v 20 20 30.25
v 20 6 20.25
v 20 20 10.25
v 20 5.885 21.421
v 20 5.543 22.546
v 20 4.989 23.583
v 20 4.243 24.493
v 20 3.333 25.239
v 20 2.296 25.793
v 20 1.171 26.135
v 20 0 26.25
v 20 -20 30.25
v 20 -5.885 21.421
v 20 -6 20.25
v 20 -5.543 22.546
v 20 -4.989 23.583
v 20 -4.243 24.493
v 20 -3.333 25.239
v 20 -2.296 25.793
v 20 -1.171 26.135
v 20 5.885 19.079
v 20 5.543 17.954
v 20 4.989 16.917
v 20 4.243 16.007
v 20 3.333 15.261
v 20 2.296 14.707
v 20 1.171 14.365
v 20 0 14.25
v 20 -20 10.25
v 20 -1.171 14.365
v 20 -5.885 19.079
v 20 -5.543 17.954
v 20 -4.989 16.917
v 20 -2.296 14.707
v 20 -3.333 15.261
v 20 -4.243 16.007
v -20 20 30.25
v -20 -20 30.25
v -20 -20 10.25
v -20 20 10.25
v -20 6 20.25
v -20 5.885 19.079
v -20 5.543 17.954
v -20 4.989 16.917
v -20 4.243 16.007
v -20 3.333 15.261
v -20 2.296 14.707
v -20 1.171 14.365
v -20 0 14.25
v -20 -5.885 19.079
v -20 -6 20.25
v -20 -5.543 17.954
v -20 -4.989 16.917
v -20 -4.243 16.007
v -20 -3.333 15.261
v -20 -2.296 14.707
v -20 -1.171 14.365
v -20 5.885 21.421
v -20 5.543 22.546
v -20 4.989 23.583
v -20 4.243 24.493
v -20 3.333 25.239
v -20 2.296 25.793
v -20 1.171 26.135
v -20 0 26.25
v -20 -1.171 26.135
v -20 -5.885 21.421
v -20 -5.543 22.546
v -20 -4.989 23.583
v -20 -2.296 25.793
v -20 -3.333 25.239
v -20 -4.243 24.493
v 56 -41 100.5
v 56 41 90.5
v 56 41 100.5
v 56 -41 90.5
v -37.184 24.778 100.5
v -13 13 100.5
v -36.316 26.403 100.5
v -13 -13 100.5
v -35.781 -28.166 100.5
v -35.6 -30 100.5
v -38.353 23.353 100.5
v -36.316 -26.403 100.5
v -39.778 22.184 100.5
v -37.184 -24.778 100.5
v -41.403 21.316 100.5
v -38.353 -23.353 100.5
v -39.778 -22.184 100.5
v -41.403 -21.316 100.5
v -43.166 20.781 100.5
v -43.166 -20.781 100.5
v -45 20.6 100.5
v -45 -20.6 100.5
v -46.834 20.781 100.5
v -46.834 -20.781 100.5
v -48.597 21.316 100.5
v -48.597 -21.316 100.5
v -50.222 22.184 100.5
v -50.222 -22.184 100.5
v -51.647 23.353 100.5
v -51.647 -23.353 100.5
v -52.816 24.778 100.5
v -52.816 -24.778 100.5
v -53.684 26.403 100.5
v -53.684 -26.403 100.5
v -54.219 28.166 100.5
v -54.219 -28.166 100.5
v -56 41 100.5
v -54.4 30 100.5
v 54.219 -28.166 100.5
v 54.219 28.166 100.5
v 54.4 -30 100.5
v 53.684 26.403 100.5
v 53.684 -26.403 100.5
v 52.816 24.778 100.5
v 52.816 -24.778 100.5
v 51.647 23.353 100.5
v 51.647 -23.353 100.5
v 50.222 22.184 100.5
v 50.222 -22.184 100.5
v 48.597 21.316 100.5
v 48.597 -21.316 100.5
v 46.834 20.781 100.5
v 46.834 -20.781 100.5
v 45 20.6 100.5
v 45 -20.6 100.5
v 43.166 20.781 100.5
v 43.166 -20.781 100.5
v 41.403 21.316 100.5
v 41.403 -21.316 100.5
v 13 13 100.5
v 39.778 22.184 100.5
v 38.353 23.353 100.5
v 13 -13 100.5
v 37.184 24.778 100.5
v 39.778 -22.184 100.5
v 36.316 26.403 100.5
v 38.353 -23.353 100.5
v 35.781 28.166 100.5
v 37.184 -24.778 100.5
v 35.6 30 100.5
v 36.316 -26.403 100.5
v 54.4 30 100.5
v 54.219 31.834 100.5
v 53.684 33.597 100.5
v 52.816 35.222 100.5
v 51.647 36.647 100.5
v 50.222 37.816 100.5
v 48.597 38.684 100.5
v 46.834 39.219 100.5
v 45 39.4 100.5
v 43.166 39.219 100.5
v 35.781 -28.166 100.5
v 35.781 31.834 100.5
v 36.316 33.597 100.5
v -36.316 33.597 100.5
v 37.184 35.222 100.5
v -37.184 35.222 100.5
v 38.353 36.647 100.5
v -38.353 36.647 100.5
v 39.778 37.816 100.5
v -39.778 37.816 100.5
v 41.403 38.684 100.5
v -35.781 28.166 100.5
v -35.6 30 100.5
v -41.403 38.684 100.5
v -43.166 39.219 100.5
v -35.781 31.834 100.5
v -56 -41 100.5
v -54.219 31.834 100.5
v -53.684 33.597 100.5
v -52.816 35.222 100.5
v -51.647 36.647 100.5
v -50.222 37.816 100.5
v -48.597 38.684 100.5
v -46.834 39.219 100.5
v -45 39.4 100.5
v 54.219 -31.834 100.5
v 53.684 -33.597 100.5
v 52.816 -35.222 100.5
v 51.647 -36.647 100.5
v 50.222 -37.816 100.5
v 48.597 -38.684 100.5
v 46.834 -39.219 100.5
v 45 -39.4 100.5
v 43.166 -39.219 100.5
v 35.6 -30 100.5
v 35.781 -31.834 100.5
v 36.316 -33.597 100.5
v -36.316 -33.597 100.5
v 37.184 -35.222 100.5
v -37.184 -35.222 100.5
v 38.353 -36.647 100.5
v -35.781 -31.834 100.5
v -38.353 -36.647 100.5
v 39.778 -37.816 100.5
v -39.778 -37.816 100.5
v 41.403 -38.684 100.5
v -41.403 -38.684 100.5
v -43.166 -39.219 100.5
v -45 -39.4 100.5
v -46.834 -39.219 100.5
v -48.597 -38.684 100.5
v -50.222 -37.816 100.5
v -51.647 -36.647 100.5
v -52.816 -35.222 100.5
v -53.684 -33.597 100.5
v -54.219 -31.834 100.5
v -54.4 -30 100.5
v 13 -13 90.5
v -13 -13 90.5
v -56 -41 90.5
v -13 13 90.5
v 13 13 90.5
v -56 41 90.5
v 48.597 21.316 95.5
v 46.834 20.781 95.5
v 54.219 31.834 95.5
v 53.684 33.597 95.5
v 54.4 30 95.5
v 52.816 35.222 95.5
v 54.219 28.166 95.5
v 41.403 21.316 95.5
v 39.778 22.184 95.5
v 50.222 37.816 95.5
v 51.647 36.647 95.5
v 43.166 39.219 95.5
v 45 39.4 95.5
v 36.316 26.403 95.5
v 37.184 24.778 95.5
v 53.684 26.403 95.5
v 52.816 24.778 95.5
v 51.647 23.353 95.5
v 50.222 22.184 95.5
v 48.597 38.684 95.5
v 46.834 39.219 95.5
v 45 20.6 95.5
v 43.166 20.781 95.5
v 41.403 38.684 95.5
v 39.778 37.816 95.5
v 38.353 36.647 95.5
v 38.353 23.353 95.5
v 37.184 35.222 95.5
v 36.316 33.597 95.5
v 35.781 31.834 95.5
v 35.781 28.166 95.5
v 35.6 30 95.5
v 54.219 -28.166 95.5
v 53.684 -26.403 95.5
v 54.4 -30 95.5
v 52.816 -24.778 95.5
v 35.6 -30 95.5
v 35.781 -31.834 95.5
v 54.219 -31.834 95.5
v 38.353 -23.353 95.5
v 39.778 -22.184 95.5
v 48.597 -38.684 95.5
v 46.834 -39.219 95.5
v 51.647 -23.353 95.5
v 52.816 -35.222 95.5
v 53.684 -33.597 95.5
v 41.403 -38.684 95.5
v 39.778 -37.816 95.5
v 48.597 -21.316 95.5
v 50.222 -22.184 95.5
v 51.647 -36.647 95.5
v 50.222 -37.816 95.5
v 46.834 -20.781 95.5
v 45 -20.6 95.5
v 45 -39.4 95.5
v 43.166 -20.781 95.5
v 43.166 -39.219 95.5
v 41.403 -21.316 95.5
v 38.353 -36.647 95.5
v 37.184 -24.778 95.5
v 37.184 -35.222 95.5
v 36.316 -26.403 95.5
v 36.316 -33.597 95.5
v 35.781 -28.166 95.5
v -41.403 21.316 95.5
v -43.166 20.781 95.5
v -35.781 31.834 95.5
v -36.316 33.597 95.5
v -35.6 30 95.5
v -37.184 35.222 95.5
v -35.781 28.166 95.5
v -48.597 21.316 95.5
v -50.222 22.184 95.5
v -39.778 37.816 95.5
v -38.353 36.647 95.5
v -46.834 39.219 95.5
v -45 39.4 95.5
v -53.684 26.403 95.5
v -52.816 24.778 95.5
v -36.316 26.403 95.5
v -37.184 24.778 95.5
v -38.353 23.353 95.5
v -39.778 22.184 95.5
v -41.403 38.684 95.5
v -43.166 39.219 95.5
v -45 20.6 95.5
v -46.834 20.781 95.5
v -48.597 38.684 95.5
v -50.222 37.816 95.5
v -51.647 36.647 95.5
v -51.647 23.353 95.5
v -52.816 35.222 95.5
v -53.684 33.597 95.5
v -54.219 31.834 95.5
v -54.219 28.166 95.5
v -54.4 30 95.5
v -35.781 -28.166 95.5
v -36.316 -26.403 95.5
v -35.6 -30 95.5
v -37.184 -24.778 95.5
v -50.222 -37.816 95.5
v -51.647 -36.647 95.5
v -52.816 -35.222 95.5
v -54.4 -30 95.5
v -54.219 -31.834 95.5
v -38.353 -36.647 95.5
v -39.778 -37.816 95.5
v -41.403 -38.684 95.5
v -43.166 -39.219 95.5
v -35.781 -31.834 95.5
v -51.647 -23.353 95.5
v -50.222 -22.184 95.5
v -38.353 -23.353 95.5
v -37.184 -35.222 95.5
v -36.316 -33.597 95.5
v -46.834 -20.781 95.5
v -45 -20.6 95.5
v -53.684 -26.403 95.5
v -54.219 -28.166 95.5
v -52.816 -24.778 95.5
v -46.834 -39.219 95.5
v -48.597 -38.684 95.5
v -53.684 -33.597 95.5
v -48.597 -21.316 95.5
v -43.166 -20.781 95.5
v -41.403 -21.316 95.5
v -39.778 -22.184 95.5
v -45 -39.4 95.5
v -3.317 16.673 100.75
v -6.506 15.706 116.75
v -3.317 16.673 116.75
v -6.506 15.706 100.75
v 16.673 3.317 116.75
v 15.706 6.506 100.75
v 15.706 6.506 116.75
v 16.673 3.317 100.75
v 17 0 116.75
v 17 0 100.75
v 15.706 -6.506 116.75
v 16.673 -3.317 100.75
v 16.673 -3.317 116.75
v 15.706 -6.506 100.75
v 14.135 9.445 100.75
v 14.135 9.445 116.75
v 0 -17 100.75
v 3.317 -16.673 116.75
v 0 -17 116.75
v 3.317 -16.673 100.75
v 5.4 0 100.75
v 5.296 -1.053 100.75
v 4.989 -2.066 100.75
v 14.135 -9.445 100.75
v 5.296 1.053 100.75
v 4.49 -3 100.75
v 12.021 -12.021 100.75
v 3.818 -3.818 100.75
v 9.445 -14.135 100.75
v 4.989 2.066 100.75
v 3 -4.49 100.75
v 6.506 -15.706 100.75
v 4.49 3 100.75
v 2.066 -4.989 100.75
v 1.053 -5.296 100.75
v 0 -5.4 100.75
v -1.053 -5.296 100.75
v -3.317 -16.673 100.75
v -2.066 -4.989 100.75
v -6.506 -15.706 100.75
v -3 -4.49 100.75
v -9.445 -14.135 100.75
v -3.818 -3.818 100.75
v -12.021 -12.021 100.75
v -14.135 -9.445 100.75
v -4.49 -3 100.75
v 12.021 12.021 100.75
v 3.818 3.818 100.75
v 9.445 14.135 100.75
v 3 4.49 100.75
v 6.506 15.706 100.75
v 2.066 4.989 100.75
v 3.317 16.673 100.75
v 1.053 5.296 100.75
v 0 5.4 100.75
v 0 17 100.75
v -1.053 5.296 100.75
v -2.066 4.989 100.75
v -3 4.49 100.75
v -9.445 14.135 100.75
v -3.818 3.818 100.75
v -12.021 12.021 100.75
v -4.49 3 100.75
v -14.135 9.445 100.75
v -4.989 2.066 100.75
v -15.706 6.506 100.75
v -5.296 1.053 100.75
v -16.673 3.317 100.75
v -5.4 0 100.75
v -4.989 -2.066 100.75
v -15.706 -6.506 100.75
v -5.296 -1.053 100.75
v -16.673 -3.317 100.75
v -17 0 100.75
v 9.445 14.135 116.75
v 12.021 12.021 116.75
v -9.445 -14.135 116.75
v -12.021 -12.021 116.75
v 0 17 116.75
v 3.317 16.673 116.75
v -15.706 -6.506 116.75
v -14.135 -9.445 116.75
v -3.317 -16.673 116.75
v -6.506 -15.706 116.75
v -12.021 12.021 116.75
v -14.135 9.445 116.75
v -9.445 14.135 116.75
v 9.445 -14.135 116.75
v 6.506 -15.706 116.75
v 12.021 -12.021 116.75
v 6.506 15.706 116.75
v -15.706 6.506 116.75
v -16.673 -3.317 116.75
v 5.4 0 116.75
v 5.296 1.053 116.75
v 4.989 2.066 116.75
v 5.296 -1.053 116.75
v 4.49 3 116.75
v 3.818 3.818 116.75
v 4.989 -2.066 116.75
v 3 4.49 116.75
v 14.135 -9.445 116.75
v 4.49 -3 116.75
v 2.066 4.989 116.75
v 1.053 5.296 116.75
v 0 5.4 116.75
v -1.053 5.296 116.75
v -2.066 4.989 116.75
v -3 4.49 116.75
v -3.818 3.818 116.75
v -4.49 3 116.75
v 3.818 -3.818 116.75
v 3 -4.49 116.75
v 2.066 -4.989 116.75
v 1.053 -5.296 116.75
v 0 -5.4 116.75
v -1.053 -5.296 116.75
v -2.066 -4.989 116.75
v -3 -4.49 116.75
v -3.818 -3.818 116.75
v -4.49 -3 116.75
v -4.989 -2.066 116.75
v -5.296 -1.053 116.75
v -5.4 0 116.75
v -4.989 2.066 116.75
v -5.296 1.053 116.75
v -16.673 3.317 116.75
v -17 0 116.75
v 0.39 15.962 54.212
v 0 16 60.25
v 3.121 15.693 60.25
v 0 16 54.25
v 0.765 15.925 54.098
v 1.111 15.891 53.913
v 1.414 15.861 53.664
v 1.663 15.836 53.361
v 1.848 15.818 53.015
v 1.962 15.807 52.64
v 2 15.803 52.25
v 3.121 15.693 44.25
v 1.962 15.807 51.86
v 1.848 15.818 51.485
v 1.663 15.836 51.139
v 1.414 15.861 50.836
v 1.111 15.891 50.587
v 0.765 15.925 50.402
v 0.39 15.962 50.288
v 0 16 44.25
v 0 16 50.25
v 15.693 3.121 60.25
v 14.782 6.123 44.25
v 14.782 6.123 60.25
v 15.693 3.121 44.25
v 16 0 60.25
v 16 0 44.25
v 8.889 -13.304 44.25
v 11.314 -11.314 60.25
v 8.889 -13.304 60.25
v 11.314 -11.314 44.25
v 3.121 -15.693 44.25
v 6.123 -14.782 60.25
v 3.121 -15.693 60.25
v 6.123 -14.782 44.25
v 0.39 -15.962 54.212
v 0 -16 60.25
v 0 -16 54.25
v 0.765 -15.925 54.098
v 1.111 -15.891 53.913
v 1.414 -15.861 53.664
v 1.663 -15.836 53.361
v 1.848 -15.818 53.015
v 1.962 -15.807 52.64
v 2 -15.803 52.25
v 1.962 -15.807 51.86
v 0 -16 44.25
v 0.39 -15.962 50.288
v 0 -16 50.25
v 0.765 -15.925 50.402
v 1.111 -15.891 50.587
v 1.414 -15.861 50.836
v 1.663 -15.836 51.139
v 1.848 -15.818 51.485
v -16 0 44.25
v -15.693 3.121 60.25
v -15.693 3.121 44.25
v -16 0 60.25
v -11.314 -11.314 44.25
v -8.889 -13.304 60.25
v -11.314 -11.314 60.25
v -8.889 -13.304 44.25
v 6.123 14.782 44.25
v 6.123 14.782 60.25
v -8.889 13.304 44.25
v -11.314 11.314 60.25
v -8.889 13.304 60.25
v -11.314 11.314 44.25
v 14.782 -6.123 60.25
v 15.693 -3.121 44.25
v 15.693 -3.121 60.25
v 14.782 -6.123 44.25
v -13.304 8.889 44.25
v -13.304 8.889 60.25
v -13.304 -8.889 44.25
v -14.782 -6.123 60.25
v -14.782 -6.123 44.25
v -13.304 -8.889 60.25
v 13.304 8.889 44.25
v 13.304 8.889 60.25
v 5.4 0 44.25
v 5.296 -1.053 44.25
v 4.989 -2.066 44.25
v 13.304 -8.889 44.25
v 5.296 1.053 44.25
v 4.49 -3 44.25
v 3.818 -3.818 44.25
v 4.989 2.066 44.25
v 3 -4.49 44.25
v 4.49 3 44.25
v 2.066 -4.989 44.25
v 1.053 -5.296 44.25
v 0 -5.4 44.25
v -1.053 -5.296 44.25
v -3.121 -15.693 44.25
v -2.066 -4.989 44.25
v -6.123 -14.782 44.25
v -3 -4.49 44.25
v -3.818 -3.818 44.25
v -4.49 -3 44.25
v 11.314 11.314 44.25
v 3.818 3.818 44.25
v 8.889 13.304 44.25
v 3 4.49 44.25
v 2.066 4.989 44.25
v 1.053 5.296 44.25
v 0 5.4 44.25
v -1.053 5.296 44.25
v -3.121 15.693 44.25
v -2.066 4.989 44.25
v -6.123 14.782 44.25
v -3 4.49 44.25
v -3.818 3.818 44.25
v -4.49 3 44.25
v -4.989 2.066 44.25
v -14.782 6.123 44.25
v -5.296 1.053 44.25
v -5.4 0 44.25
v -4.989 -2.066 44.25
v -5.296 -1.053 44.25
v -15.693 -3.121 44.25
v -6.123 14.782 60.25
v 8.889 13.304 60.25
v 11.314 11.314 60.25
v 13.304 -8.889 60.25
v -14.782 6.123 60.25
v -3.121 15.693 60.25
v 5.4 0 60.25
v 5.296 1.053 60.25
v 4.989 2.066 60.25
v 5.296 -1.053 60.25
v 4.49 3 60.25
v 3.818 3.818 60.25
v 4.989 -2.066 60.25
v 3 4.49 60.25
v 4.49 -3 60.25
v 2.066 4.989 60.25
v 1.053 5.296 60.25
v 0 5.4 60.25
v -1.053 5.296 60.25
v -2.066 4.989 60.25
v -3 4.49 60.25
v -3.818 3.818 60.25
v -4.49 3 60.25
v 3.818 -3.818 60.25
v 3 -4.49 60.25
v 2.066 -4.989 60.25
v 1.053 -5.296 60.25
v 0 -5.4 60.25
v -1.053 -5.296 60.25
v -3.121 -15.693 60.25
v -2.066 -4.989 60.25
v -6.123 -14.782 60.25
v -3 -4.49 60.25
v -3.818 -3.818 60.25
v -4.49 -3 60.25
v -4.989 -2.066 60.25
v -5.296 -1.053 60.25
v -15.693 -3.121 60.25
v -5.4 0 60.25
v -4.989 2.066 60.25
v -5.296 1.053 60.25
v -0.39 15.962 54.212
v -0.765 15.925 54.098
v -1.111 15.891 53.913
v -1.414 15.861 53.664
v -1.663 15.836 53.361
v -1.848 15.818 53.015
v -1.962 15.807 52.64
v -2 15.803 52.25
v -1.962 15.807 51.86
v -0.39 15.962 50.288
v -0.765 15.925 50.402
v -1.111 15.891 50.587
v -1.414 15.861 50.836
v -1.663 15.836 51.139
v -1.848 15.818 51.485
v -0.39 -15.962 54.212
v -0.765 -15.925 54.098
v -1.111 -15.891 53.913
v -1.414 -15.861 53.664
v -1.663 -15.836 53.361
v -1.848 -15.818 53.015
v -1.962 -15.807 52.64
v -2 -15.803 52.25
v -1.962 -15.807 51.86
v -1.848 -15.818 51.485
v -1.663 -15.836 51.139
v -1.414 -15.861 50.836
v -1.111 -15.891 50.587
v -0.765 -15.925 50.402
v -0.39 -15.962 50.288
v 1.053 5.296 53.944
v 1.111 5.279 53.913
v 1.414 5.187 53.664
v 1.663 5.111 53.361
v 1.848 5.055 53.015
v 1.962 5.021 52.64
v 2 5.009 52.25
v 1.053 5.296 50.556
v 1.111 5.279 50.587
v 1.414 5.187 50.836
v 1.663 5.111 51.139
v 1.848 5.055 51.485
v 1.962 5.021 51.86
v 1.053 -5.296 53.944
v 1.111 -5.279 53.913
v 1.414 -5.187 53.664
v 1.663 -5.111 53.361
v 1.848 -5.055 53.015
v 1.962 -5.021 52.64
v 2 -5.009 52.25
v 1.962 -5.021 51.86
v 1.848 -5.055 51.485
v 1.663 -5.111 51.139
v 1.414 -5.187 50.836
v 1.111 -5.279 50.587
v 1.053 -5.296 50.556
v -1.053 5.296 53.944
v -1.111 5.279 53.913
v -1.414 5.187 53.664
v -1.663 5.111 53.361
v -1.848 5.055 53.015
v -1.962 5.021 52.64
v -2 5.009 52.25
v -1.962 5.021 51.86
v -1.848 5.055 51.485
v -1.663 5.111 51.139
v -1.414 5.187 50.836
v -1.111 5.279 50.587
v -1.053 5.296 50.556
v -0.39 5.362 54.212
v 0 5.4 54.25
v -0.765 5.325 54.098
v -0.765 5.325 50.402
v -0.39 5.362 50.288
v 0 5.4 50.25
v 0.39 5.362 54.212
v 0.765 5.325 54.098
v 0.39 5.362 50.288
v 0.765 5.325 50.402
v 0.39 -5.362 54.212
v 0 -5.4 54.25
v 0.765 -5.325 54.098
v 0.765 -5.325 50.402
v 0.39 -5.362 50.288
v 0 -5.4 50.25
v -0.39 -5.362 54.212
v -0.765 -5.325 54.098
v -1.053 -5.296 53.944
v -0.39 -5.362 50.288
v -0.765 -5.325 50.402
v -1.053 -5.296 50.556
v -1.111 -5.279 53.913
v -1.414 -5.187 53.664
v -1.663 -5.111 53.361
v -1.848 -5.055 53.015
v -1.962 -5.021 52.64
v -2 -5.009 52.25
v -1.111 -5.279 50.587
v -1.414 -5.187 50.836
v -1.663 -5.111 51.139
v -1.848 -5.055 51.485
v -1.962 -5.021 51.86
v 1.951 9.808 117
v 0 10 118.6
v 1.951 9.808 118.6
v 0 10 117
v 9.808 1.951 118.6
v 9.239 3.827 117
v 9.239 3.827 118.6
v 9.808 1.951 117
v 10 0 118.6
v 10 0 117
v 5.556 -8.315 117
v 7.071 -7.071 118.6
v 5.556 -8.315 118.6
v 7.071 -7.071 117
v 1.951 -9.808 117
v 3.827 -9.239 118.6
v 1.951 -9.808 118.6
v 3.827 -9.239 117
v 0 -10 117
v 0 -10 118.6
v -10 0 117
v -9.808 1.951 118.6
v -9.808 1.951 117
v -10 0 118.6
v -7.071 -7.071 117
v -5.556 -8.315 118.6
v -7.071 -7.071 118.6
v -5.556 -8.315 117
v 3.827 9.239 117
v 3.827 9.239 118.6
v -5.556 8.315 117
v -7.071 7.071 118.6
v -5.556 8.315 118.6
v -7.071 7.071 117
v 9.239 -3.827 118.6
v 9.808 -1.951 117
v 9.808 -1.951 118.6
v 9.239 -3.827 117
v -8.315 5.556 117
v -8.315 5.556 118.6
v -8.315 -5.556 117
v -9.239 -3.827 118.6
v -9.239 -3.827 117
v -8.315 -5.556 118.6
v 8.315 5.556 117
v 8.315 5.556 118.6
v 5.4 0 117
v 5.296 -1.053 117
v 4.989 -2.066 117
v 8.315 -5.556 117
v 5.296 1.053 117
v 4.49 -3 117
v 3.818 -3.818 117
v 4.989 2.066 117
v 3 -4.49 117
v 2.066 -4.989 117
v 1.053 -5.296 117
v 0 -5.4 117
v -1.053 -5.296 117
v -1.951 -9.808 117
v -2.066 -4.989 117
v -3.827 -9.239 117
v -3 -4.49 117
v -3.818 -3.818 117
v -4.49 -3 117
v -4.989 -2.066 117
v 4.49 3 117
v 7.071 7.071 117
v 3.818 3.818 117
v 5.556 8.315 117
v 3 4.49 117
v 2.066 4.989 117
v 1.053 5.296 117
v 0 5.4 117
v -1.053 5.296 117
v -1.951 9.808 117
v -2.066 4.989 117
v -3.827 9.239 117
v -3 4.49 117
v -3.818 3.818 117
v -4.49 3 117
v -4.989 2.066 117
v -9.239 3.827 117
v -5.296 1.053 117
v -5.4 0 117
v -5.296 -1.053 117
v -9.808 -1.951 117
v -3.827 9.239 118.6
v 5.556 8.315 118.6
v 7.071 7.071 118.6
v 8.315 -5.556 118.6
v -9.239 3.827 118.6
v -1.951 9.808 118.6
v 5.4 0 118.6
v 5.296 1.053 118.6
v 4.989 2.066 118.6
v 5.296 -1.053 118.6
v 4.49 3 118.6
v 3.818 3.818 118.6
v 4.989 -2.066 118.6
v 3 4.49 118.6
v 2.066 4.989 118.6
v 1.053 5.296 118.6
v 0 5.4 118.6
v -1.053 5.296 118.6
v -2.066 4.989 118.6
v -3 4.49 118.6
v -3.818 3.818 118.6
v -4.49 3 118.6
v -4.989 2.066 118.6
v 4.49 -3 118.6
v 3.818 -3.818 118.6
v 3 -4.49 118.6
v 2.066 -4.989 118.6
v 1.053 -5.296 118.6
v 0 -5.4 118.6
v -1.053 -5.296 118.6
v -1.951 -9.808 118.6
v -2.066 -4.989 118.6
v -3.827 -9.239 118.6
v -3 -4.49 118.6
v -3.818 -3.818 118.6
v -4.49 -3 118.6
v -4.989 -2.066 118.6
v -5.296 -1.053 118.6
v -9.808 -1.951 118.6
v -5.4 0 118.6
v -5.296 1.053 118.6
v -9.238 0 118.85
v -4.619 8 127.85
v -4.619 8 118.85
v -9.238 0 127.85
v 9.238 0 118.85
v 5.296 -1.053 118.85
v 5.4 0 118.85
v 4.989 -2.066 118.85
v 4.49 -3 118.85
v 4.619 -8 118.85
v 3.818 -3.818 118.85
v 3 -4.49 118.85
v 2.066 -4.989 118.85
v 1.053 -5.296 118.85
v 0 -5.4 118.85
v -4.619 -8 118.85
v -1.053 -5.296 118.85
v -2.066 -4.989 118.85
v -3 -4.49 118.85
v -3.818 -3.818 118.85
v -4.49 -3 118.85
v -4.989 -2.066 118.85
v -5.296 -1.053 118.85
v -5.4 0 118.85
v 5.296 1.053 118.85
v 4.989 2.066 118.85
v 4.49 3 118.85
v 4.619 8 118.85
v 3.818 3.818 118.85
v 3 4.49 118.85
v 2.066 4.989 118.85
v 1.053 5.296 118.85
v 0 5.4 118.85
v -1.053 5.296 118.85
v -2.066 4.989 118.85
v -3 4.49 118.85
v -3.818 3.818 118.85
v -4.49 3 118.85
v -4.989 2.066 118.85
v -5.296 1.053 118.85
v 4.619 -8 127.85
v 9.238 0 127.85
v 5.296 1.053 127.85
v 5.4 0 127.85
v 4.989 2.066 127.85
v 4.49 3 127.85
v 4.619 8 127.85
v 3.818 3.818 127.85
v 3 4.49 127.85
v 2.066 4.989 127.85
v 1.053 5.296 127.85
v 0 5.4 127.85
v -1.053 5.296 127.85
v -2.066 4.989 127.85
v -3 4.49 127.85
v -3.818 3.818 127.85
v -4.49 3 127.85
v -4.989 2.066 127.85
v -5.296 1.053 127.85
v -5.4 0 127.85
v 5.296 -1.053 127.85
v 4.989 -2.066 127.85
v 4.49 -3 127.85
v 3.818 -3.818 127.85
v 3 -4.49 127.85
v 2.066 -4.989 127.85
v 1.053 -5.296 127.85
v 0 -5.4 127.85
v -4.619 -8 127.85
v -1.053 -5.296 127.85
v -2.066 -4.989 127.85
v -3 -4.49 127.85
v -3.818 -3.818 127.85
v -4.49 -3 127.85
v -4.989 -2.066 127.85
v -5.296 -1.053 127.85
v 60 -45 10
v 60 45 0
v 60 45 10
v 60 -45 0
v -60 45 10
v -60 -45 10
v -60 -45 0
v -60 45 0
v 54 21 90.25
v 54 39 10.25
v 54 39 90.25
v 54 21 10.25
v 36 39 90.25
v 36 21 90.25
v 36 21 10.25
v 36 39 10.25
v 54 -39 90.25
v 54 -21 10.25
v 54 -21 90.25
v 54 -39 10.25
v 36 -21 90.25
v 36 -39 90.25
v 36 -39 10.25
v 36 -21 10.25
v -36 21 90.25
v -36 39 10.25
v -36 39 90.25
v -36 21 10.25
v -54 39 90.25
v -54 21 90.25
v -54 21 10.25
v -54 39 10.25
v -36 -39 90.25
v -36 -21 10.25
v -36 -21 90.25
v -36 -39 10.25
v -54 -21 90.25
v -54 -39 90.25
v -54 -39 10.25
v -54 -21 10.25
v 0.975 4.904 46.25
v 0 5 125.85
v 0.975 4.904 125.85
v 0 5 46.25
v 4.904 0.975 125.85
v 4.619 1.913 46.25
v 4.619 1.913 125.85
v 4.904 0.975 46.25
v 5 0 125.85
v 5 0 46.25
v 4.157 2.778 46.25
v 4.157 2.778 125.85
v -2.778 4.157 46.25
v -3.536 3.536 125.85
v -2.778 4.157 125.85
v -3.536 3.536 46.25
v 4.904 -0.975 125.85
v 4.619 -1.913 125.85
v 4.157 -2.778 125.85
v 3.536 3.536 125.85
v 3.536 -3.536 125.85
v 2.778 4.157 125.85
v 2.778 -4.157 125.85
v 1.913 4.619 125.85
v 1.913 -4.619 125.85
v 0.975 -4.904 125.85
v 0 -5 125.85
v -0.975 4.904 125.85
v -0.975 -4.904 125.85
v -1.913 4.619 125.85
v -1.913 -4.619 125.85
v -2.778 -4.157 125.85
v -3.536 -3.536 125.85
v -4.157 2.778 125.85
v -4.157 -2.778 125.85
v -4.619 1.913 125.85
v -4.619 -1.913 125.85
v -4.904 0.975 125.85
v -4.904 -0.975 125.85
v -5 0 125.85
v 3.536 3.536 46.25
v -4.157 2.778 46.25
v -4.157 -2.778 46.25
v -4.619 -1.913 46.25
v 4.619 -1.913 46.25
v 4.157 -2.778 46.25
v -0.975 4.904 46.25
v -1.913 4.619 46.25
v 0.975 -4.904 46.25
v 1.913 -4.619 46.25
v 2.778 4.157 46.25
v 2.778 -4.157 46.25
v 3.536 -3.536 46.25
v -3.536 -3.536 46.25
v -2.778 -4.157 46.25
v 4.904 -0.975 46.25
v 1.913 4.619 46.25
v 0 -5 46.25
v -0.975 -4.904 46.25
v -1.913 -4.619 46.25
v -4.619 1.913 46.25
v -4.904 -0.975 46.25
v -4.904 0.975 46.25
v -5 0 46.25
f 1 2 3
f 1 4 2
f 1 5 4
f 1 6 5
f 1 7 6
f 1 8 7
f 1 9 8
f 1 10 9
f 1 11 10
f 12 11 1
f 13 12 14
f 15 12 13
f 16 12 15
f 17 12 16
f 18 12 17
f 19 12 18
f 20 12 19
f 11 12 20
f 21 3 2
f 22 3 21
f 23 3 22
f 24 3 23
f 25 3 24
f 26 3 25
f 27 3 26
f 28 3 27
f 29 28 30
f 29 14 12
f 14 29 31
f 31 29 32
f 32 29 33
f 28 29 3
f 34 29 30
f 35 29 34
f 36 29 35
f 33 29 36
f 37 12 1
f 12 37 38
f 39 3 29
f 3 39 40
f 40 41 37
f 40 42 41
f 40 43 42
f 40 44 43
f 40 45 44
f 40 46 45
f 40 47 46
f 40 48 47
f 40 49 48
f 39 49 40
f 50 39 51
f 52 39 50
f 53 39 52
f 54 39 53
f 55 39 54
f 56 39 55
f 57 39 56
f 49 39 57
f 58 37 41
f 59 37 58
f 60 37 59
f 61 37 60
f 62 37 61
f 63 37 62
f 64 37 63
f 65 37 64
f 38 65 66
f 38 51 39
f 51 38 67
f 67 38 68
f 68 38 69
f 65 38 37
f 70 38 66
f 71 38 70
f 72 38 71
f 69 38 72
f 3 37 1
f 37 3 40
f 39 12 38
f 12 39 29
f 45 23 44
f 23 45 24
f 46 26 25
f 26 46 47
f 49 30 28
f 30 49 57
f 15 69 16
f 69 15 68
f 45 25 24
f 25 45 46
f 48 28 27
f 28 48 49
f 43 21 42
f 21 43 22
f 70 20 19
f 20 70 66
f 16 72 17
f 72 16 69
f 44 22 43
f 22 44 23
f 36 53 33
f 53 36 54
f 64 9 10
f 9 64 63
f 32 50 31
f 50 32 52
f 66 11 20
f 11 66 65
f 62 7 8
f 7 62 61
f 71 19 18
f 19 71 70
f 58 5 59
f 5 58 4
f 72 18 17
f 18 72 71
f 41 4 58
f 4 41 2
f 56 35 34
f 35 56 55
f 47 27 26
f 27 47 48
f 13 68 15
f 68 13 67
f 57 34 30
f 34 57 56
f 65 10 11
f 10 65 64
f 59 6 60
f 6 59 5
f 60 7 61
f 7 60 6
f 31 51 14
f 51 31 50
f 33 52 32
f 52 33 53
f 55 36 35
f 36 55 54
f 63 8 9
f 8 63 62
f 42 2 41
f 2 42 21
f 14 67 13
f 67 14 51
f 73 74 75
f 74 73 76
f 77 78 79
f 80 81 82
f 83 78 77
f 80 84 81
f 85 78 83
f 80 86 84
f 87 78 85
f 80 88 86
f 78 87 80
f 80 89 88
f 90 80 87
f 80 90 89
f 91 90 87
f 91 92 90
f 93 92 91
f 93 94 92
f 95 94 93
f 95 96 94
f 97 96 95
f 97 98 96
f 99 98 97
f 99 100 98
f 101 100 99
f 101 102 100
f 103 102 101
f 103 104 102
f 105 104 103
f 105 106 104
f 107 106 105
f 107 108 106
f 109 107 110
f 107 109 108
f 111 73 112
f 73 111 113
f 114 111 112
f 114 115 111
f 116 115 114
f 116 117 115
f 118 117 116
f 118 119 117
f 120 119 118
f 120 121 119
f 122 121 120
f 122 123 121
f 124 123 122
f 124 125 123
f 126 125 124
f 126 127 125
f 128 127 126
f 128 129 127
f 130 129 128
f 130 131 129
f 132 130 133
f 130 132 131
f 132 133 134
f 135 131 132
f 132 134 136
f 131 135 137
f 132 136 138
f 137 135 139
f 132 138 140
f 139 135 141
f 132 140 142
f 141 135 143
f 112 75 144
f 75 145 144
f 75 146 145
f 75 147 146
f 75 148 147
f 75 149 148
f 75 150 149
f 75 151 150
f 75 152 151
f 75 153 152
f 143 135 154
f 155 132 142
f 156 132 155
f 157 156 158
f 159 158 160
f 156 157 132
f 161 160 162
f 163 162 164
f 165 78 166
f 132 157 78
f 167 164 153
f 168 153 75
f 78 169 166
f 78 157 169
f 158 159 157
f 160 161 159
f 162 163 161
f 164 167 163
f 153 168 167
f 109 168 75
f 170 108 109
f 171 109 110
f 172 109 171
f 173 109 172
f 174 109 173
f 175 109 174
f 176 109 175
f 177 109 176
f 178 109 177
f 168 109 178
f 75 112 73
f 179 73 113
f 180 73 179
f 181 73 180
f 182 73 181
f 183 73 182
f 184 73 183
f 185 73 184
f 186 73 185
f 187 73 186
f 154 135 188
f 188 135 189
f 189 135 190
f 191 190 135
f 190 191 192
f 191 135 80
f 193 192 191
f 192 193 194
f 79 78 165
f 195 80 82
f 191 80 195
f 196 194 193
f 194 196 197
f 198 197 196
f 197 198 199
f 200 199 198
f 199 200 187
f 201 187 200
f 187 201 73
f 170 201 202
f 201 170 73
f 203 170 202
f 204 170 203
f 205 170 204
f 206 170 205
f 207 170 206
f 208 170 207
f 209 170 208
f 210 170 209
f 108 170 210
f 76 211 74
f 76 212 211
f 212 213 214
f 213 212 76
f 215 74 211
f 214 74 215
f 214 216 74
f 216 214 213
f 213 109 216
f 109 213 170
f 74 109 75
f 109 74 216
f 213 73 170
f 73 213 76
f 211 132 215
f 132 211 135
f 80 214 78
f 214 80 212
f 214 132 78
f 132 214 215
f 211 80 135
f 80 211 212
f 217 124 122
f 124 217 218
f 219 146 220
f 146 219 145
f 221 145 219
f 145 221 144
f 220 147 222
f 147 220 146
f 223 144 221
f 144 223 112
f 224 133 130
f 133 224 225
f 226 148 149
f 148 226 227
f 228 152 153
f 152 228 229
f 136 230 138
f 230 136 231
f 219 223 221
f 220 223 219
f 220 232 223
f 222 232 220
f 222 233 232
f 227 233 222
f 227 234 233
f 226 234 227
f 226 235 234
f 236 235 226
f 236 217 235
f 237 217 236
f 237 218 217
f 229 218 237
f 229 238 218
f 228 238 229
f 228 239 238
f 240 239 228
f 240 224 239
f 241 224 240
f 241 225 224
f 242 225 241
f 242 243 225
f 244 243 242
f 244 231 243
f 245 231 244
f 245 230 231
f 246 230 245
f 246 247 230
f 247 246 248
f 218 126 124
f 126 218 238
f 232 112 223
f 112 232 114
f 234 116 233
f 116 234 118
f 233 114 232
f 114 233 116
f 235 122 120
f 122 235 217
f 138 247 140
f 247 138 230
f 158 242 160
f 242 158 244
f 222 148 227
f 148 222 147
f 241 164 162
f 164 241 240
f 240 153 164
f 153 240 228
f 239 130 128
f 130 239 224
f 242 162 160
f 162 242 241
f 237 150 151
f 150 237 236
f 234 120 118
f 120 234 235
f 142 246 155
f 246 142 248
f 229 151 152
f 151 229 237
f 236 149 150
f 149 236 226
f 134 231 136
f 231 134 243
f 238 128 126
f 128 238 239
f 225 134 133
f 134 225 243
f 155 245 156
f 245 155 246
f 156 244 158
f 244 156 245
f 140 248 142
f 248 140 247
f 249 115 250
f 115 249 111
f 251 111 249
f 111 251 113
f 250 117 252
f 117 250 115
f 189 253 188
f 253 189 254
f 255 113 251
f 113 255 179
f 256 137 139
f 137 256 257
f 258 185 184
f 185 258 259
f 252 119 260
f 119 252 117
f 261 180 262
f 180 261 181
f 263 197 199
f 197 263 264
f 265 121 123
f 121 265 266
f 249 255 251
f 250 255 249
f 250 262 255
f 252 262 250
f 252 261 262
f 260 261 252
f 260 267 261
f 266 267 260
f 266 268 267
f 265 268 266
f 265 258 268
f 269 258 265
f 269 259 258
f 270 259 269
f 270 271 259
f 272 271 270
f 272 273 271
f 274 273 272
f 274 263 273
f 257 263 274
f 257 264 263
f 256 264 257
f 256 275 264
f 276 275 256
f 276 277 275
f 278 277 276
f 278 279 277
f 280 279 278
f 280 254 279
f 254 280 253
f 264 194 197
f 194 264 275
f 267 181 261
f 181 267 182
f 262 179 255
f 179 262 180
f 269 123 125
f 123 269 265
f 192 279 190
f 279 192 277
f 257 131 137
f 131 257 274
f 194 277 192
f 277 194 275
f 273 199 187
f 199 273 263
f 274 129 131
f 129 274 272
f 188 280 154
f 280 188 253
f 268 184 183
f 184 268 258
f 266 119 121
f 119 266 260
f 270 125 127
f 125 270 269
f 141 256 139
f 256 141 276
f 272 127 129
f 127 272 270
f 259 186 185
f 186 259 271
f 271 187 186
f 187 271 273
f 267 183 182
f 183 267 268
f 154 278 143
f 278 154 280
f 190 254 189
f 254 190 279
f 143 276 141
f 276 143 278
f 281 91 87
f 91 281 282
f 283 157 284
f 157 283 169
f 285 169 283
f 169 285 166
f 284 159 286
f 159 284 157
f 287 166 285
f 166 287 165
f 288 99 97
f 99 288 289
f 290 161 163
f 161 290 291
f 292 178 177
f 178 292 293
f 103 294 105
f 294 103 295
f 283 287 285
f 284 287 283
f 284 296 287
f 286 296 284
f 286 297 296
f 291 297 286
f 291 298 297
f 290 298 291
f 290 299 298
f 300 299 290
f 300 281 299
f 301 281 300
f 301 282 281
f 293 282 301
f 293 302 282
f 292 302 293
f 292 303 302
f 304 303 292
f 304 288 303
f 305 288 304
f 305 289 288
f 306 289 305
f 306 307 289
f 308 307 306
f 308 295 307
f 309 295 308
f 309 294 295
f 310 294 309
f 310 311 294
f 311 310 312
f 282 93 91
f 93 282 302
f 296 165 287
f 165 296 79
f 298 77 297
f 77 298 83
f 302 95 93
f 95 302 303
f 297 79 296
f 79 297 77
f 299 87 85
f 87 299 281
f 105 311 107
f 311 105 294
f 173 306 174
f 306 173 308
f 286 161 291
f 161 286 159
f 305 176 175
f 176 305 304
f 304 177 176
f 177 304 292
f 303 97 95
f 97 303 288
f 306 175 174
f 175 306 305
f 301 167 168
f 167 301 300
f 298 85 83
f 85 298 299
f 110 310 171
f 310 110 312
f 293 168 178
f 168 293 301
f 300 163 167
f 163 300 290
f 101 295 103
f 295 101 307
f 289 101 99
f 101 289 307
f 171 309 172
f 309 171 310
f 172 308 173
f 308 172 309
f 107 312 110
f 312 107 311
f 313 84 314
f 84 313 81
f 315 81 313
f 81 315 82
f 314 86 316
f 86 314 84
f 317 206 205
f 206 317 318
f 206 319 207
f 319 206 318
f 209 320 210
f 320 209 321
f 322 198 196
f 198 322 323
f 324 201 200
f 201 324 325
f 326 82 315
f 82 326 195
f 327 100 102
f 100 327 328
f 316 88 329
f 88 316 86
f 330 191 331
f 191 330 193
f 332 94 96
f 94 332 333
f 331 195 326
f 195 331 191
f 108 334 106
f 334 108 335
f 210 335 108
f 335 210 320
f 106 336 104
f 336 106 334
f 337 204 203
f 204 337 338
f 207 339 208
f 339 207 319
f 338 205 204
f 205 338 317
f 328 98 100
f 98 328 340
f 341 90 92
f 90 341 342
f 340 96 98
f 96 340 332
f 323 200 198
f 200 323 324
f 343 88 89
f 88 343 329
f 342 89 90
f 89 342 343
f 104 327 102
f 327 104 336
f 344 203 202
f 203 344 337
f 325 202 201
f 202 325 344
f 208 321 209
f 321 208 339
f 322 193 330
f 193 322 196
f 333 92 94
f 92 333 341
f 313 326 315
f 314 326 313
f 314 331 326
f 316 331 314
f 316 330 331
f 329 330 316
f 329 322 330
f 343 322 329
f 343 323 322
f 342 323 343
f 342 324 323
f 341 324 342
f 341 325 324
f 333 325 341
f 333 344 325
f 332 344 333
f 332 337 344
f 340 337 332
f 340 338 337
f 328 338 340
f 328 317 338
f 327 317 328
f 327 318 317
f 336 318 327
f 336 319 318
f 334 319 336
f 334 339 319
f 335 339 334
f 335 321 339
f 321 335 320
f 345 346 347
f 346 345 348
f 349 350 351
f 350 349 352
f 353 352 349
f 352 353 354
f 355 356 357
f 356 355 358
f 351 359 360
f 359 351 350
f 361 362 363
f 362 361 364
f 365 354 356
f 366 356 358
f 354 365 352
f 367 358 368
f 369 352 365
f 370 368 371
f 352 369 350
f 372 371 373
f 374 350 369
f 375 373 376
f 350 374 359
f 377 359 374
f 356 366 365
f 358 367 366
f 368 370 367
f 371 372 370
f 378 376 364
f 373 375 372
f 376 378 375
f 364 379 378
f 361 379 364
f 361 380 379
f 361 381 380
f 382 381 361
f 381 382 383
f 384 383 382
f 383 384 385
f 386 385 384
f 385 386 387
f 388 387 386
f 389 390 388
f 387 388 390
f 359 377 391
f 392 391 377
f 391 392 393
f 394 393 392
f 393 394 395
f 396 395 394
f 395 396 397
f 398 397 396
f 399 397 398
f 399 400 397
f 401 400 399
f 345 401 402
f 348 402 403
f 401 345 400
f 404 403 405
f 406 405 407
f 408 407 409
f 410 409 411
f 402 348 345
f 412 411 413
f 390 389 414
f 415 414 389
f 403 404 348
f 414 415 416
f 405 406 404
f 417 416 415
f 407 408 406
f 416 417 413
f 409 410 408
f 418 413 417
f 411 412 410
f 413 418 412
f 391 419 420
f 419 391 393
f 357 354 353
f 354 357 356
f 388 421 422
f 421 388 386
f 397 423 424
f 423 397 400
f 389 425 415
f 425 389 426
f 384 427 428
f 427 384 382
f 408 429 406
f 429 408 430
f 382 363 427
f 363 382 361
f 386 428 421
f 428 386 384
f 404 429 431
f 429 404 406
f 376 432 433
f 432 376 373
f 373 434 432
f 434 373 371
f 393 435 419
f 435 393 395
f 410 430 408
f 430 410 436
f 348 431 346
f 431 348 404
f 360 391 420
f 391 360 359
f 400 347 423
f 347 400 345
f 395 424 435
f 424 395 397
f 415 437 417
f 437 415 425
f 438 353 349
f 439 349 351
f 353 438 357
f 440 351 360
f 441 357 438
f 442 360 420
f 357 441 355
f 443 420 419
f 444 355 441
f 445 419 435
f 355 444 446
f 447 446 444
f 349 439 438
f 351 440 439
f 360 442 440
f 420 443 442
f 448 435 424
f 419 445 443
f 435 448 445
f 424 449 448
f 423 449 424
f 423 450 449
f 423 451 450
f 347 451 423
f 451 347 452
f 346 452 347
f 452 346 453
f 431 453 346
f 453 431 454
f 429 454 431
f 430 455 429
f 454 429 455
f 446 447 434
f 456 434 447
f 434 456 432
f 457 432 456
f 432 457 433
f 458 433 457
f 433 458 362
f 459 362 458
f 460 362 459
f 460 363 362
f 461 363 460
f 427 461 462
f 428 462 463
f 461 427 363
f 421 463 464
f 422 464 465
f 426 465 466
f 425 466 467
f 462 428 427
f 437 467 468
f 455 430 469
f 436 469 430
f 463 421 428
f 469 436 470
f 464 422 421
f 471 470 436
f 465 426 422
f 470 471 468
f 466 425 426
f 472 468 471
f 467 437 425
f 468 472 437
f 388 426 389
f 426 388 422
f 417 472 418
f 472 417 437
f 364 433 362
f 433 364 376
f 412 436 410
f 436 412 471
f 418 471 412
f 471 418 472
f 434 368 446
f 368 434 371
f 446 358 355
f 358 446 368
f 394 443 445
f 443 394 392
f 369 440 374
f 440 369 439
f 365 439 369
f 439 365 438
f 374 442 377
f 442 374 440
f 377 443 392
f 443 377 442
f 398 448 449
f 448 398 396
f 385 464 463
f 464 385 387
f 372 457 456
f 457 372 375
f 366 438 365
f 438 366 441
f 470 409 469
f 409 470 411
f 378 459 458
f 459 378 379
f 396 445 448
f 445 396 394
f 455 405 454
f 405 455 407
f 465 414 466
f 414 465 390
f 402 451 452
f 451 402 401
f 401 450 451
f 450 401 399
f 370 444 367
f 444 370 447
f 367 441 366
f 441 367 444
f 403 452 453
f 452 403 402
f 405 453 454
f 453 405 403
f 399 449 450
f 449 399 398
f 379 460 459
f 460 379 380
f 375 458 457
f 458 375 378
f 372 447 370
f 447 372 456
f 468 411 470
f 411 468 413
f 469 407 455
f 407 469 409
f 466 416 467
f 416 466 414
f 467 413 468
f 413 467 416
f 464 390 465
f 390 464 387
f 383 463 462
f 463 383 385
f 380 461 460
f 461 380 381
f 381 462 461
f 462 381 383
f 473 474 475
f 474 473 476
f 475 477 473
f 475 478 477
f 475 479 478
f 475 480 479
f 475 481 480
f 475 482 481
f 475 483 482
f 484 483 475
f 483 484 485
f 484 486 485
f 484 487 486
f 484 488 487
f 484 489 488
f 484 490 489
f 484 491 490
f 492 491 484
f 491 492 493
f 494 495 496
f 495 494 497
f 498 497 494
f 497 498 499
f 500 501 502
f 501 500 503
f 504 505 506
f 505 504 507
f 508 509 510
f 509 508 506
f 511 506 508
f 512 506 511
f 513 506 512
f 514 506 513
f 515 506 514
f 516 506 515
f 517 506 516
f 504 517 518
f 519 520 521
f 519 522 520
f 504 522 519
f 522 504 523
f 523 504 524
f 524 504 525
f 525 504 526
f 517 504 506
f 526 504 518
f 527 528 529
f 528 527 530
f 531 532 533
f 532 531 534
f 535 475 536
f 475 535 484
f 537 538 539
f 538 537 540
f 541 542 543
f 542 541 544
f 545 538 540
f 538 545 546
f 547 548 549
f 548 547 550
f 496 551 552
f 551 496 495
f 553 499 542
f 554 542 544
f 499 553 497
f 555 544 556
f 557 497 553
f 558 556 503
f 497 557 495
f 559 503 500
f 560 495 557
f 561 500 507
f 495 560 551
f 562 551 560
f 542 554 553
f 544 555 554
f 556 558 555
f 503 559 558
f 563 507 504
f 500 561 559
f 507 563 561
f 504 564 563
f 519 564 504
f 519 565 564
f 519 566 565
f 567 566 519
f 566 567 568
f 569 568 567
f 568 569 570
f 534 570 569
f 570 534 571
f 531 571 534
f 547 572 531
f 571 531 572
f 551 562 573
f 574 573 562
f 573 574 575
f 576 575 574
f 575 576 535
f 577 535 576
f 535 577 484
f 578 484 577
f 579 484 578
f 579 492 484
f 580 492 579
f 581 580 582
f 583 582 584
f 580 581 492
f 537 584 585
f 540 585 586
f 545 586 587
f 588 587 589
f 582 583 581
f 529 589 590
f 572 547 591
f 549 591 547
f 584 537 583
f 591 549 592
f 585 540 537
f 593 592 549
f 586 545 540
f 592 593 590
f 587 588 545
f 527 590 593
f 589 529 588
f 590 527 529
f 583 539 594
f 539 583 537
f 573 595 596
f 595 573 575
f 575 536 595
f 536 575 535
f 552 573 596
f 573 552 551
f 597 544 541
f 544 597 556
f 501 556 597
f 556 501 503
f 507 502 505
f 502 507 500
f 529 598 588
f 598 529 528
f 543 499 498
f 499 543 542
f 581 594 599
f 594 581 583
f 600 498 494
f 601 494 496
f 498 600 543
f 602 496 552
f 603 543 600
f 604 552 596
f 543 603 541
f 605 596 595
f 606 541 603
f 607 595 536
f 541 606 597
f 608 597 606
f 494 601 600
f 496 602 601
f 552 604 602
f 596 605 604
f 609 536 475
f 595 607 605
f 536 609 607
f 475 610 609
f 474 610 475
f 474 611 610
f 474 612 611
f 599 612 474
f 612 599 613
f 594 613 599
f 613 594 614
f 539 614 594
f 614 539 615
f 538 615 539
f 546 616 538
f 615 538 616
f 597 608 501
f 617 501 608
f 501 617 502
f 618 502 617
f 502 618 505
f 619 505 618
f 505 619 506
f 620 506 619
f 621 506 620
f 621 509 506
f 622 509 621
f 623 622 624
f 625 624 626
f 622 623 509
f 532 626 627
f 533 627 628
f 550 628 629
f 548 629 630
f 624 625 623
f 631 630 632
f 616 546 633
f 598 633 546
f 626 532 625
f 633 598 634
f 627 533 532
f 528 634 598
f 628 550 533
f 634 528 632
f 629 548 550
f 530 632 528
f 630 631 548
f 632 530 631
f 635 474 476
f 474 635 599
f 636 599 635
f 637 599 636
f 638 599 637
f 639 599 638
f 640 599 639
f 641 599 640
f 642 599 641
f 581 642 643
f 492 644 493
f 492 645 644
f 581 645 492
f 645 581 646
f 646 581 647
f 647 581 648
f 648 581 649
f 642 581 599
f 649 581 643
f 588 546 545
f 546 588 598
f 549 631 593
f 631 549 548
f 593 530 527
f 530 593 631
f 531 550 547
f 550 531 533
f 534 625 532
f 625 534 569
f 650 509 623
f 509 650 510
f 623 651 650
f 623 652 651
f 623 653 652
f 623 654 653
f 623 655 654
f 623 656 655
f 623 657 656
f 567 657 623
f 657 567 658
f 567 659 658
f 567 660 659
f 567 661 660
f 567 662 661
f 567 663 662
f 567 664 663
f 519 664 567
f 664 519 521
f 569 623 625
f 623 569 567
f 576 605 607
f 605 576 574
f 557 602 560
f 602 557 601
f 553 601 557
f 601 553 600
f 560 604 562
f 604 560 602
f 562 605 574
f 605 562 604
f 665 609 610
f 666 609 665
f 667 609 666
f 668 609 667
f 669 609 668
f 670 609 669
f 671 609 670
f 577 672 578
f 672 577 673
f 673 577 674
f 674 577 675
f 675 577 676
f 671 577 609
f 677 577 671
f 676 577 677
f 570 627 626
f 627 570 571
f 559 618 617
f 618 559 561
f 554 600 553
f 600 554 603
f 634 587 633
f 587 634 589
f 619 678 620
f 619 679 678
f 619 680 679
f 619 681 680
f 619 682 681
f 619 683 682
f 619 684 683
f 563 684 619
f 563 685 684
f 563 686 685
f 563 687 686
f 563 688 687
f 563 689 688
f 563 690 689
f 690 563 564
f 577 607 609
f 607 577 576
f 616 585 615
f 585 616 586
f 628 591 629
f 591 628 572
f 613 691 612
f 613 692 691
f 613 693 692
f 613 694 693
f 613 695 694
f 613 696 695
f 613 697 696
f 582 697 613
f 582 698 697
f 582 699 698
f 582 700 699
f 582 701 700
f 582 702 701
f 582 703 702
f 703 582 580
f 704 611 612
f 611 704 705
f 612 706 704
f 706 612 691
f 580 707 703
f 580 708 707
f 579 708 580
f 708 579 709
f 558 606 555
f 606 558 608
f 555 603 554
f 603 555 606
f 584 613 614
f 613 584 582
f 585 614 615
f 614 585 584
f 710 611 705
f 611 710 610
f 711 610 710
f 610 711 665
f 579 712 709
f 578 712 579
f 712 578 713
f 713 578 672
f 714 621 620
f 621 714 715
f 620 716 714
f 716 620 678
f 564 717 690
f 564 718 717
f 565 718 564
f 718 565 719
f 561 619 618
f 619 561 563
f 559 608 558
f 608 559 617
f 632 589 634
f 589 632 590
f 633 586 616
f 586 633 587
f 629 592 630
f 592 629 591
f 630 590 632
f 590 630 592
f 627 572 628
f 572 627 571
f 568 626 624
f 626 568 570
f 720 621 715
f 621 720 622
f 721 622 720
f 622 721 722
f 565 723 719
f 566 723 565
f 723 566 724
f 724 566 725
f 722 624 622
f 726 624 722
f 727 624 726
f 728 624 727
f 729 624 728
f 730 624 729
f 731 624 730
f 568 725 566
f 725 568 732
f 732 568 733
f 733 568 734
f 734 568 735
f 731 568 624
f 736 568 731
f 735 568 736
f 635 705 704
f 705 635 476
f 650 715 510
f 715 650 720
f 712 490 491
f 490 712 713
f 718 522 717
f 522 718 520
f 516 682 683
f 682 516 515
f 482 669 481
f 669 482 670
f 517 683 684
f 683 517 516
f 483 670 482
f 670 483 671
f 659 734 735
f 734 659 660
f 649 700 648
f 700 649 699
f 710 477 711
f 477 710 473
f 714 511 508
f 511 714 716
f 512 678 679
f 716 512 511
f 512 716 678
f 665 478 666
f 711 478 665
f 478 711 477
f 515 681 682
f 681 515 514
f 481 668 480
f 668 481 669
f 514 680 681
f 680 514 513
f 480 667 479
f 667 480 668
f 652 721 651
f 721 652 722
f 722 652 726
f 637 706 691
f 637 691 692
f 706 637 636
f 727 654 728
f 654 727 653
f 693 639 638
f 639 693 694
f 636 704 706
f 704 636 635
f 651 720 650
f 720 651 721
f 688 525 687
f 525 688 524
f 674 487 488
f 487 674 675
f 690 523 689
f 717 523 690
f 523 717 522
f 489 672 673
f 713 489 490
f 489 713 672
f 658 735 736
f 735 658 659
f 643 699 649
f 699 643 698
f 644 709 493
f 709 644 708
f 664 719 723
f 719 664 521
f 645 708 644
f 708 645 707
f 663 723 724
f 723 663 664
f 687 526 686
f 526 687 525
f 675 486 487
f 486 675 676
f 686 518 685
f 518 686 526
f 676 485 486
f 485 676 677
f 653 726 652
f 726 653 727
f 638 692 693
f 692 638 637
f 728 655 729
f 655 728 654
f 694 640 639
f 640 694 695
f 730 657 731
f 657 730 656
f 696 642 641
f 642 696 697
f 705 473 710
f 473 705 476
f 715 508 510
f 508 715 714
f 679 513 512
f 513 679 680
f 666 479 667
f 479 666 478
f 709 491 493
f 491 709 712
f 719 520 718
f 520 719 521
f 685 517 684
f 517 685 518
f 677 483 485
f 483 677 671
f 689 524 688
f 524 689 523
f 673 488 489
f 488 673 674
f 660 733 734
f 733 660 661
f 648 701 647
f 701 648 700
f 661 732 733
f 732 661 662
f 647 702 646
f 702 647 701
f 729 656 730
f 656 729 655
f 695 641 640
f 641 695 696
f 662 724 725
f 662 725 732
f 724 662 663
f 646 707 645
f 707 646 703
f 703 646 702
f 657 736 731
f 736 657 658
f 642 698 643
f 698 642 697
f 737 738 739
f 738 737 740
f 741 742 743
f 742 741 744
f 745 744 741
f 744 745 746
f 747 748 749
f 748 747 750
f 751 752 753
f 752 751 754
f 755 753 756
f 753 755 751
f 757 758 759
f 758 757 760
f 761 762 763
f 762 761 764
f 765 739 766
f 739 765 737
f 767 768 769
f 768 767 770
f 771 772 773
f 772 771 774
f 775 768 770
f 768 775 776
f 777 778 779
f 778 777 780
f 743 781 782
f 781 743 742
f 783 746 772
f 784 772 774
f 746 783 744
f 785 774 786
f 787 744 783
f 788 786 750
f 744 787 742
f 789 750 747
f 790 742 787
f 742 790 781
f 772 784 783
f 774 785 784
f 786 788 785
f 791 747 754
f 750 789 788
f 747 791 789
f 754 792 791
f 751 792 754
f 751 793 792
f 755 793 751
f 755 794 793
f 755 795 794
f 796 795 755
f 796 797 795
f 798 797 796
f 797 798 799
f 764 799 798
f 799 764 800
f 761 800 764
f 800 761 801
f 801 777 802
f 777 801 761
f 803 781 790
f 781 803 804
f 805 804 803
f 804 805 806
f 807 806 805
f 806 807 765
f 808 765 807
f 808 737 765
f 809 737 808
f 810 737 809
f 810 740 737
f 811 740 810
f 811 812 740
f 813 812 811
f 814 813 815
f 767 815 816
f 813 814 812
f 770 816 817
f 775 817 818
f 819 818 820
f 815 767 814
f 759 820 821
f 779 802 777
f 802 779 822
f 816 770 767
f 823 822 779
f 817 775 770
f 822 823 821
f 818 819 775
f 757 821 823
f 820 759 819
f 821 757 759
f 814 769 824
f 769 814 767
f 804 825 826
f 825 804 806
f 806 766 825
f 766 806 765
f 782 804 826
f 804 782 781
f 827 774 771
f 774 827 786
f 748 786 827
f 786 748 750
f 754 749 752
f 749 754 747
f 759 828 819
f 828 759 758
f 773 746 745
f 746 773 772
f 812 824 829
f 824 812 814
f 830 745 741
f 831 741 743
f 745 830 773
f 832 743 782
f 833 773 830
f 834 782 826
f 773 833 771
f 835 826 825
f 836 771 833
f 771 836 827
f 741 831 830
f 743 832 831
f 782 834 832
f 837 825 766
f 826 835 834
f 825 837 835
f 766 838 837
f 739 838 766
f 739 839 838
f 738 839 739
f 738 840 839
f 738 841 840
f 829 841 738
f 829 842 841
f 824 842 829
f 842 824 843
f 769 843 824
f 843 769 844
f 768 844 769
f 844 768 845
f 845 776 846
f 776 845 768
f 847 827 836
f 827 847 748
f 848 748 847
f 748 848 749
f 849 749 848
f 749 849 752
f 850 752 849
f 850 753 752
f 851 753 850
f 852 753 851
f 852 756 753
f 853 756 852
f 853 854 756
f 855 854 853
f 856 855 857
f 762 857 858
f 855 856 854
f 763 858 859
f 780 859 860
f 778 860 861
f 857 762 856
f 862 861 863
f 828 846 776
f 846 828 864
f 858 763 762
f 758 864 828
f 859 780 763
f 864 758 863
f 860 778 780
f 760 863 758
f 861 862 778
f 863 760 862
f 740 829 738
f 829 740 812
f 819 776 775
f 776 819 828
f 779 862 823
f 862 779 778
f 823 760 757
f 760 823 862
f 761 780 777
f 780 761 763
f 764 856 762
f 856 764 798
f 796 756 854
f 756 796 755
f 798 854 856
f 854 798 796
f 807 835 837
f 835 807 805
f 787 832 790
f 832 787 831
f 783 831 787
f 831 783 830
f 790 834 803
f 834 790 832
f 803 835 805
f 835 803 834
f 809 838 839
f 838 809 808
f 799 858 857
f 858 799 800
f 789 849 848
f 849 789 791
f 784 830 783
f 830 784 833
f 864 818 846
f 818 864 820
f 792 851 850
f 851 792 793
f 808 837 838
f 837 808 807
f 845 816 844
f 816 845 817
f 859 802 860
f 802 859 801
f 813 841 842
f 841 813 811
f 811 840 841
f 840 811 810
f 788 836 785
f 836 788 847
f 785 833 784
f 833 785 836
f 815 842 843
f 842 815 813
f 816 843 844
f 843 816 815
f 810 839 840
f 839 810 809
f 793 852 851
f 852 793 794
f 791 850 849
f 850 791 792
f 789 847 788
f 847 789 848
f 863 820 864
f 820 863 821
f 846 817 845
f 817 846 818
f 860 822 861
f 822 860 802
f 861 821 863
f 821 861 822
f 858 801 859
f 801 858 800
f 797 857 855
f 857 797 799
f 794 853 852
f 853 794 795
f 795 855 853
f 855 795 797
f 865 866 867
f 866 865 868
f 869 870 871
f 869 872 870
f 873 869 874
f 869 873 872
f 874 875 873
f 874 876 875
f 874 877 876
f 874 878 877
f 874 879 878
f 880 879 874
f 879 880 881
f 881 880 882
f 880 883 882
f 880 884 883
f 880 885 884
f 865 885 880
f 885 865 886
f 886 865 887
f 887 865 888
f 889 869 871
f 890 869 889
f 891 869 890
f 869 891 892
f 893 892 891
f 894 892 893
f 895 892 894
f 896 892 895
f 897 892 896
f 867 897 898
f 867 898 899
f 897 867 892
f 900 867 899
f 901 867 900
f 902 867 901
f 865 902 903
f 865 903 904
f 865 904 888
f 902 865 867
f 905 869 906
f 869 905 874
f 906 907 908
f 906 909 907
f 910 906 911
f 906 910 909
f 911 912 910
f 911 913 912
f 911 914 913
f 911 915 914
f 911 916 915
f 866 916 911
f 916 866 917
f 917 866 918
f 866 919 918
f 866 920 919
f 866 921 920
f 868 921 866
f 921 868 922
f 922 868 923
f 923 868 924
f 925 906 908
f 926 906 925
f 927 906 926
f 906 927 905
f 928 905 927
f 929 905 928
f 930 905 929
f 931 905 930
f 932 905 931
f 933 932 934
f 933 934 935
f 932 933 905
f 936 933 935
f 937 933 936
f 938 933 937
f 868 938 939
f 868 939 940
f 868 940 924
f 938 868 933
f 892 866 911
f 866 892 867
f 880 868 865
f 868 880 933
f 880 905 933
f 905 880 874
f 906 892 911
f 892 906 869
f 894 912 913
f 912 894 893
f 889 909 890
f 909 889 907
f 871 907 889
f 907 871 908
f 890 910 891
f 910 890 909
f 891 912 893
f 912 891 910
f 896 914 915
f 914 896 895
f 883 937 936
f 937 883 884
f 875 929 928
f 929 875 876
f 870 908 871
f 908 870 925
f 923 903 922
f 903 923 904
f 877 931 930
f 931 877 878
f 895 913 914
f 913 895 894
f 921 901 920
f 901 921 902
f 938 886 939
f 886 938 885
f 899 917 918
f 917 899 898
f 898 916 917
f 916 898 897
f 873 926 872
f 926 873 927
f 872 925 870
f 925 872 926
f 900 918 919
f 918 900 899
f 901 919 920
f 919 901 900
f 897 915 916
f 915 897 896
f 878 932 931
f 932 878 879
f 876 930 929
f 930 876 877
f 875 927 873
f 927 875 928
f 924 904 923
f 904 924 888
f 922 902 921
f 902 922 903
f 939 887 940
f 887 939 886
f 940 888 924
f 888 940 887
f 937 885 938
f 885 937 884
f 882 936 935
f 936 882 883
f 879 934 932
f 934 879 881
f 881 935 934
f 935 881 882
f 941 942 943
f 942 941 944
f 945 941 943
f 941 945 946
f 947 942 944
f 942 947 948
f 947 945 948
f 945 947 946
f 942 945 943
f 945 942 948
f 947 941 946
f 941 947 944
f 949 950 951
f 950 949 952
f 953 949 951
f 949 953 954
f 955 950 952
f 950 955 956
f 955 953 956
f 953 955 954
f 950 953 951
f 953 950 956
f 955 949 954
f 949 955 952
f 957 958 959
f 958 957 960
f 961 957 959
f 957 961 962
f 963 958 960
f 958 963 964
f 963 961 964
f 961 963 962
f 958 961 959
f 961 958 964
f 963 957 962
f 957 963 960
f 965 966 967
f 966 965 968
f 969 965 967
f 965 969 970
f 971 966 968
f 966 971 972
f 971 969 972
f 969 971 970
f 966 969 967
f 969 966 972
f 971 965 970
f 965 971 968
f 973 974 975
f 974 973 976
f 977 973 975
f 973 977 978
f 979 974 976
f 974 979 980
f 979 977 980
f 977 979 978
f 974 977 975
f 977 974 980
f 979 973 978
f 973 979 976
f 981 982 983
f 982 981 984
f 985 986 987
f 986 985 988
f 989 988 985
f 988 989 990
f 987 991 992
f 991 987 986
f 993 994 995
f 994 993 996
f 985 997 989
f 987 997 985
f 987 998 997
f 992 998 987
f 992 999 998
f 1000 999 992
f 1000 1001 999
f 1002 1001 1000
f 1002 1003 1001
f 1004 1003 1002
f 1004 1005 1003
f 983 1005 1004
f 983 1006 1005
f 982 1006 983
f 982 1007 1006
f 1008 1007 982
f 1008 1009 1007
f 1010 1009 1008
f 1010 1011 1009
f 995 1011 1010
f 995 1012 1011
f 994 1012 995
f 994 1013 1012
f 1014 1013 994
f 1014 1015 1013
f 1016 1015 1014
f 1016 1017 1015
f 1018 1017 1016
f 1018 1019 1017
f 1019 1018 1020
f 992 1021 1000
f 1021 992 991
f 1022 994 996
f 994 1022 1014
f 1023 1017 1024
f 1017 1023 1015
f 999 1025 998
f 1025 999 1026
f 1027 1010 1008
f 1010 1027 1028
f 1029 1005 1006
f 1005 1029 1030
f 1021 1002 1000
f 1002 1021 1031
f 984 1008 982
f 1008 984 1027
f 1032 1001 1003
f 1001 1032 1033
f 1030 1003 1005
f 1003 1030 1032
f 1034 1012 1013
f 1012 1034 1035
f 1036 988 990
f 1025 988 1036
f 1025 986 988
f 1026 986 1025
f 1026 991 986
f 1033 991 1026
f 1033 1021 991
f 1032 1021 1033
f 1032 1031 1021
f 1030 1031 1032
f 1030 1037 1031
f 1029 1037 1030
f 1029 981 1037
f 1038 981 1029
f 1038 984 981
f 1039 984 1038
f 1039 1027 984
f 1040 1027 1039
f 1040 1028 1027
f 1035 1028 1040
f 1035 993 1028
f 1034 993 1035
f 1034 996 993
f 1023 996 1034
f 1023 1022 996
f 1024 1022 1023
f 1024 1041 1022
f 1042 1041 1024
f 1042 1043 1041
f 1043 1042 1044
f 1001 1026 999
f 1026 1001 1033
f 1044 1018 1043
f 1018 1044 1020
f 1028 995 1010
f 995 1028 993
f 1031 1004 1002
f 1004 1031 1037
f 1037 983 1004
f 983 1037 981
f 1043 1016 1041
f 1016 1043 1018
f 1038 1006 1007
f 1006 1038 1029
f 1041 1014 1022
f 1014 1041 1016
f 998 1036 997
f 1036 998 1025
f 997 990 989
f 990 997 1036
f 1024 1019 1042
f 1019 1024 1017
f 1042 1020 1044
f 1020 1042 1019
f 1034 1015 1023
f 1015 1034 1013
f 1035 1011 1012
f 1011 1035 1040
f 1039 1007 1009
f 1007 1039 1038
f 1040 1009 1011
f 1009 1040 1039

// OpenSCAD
$fn = 32;

// ------------------------------------------------------------------------
// Arbor press fixture: screw d10, posts 80 mm, gap 14 mm
// Every part is its own module, assembly() places every instance.
// ------------------------------------------------------------------------

// --- part 1 ---
module press_bed() {
  difference() {
    translate([-60, -45, 0]) cube([120, 90, 10]);
  }
}

// --- part 2 ---
module anvil_block() {
  difference() {
    translate([-20, -20, 0]) cube([40, 40, 20]);
    translate([0, 0, 10]) rotate([0, 90, 0]) cylinder(h = 42, d = 12, center = true);
  }
}

// --- part 3 ---
module press_post_a() {
  translate([-9, -9, 0]) cube([18, 18, 80]);
}

// --- part 4 ---
module press_post_b() {
  translate([-9, -9, 0]) cube([18, 18, 80]);
}

// --- part 5 ---
module press_post_c() {
  translate([-9, -9, 0]) cube([18, 18, 80]);
}

// --- part 6 ---
module press_post_d() {
  translate([-9, -9, 0]) cube([18, 18, 80]);
}

// --- part 7 ---
module press_frame() {
  difference() {
    translate([-56, -41, 0]) cube([112, 82, 10]);
    translate([-13, -13, -1]) cube([26, 26, 12]);
    translate([45, 30, 5]) cylinder(h = 6, d = 18.8);
    translate([45, -30, 5]) cylinder(h = 6, d = 18.8);
    translate([-45, 30, 5]) cylinder(h = 6, d = 18.8);
    translate([-45, -30, 5]) cylinder(h = 6, d = 18.8);
  }
}

// --- part 8 ---
module guide_ring() {
  difference() {
      translate([0, 0, 0]) cylinder(h = 16, d = 34);
      translate([0, 0, -1]) cylinder(h = 18, d = 10.8);
    }
}

// --- part 9 ---
module press_screw() {
  translate([0, 0, -39.8]) cylinder(h = 79.6, d = 10);
}

// --- part 10 ---
module press_head() {
  difference() {
    cylinder(h = 16, d = 32);
    translate([0, 0, -1]) cylinder(h = 18, d = 10.8);
    translate([0, 0, 8]) rotate([90, 0, 0]) cylinder(h = 34, d = 4, center = true);
  }
}

// --- part 11 ---
module nut_washer() {
  difference() {
      translate([0, 0, 0]) cylinder(h = 1.6, d = 20);
      translate([0, 0, -1]) cylinder(h = 3.6, d = 10.8);
    }
}

// --- part 12 ---
module press_nut() {
  difference() {
    linear_extrude(height = 9) polygon(points = [[9.238, 0], [4.619, 8], [-4.619, 8], [-9.238, 0], [-4.619, -8], [4.619, -8]]);
    translate([0, 0, -1]) cylinder(h = 11, d = 10.8);
  }
}

// --- assembly ---
module assembly() {
  color([0.80, 0.24, 0.20]) translate([0, 0, 0]) rotate([0, 0, 0]) press_bed();
  color([0.20, 0.45, 0.75]) translate([0, 0, 10.25]) rotate([0, 0, 0]) anvil_block();
  color([0.25, 0.62, 0.32]) translate([45, 30, 10.25]) rotate([0, 0, 0]) press_post_a();
  color([0.92, 0.70, 0.18]) translate([45, -30, 10.25]) rotate([0, 0, 0]) press_post_b();
  color([0.58, 0.35, 0.70]) translate([-45, 30, 10.25]) rotate([0, 0, 0]) press_post_c();
  color([0.16, 0.66, 0.66]) translate([-45, -30, 10.25]) rotate([0, 0, 0]) press_post_d();
  color([0.85, 0.48, 0.18]) translate([0, 0, 90.5]) rotate([0, 0, 0]) press_frame();
  color([0.55, 0.60, 0.65]) translate([0, 0, 100.75]) rotate([0, 0, 0]) guide_ring();
  color([0.75, 0.30, 0.55]) translate([0, 0, 86.05]) rotate([0, 0, 0]) press_screw();
  color([0.42, 0.52, 0.28]) translate([0, 0, 44.25]) rotate([0, 0, 0]) press_head();
  color([0.80, 0.24, 0.20]) translate([0, 0, 117]) rotate([0, 0, 0]) nut_washer();
  color([0.20, 0.45, 0.75]) translate([0, 0, 118.85]) rotate([0, 0, 0]) press_nut();
}

assembly();
